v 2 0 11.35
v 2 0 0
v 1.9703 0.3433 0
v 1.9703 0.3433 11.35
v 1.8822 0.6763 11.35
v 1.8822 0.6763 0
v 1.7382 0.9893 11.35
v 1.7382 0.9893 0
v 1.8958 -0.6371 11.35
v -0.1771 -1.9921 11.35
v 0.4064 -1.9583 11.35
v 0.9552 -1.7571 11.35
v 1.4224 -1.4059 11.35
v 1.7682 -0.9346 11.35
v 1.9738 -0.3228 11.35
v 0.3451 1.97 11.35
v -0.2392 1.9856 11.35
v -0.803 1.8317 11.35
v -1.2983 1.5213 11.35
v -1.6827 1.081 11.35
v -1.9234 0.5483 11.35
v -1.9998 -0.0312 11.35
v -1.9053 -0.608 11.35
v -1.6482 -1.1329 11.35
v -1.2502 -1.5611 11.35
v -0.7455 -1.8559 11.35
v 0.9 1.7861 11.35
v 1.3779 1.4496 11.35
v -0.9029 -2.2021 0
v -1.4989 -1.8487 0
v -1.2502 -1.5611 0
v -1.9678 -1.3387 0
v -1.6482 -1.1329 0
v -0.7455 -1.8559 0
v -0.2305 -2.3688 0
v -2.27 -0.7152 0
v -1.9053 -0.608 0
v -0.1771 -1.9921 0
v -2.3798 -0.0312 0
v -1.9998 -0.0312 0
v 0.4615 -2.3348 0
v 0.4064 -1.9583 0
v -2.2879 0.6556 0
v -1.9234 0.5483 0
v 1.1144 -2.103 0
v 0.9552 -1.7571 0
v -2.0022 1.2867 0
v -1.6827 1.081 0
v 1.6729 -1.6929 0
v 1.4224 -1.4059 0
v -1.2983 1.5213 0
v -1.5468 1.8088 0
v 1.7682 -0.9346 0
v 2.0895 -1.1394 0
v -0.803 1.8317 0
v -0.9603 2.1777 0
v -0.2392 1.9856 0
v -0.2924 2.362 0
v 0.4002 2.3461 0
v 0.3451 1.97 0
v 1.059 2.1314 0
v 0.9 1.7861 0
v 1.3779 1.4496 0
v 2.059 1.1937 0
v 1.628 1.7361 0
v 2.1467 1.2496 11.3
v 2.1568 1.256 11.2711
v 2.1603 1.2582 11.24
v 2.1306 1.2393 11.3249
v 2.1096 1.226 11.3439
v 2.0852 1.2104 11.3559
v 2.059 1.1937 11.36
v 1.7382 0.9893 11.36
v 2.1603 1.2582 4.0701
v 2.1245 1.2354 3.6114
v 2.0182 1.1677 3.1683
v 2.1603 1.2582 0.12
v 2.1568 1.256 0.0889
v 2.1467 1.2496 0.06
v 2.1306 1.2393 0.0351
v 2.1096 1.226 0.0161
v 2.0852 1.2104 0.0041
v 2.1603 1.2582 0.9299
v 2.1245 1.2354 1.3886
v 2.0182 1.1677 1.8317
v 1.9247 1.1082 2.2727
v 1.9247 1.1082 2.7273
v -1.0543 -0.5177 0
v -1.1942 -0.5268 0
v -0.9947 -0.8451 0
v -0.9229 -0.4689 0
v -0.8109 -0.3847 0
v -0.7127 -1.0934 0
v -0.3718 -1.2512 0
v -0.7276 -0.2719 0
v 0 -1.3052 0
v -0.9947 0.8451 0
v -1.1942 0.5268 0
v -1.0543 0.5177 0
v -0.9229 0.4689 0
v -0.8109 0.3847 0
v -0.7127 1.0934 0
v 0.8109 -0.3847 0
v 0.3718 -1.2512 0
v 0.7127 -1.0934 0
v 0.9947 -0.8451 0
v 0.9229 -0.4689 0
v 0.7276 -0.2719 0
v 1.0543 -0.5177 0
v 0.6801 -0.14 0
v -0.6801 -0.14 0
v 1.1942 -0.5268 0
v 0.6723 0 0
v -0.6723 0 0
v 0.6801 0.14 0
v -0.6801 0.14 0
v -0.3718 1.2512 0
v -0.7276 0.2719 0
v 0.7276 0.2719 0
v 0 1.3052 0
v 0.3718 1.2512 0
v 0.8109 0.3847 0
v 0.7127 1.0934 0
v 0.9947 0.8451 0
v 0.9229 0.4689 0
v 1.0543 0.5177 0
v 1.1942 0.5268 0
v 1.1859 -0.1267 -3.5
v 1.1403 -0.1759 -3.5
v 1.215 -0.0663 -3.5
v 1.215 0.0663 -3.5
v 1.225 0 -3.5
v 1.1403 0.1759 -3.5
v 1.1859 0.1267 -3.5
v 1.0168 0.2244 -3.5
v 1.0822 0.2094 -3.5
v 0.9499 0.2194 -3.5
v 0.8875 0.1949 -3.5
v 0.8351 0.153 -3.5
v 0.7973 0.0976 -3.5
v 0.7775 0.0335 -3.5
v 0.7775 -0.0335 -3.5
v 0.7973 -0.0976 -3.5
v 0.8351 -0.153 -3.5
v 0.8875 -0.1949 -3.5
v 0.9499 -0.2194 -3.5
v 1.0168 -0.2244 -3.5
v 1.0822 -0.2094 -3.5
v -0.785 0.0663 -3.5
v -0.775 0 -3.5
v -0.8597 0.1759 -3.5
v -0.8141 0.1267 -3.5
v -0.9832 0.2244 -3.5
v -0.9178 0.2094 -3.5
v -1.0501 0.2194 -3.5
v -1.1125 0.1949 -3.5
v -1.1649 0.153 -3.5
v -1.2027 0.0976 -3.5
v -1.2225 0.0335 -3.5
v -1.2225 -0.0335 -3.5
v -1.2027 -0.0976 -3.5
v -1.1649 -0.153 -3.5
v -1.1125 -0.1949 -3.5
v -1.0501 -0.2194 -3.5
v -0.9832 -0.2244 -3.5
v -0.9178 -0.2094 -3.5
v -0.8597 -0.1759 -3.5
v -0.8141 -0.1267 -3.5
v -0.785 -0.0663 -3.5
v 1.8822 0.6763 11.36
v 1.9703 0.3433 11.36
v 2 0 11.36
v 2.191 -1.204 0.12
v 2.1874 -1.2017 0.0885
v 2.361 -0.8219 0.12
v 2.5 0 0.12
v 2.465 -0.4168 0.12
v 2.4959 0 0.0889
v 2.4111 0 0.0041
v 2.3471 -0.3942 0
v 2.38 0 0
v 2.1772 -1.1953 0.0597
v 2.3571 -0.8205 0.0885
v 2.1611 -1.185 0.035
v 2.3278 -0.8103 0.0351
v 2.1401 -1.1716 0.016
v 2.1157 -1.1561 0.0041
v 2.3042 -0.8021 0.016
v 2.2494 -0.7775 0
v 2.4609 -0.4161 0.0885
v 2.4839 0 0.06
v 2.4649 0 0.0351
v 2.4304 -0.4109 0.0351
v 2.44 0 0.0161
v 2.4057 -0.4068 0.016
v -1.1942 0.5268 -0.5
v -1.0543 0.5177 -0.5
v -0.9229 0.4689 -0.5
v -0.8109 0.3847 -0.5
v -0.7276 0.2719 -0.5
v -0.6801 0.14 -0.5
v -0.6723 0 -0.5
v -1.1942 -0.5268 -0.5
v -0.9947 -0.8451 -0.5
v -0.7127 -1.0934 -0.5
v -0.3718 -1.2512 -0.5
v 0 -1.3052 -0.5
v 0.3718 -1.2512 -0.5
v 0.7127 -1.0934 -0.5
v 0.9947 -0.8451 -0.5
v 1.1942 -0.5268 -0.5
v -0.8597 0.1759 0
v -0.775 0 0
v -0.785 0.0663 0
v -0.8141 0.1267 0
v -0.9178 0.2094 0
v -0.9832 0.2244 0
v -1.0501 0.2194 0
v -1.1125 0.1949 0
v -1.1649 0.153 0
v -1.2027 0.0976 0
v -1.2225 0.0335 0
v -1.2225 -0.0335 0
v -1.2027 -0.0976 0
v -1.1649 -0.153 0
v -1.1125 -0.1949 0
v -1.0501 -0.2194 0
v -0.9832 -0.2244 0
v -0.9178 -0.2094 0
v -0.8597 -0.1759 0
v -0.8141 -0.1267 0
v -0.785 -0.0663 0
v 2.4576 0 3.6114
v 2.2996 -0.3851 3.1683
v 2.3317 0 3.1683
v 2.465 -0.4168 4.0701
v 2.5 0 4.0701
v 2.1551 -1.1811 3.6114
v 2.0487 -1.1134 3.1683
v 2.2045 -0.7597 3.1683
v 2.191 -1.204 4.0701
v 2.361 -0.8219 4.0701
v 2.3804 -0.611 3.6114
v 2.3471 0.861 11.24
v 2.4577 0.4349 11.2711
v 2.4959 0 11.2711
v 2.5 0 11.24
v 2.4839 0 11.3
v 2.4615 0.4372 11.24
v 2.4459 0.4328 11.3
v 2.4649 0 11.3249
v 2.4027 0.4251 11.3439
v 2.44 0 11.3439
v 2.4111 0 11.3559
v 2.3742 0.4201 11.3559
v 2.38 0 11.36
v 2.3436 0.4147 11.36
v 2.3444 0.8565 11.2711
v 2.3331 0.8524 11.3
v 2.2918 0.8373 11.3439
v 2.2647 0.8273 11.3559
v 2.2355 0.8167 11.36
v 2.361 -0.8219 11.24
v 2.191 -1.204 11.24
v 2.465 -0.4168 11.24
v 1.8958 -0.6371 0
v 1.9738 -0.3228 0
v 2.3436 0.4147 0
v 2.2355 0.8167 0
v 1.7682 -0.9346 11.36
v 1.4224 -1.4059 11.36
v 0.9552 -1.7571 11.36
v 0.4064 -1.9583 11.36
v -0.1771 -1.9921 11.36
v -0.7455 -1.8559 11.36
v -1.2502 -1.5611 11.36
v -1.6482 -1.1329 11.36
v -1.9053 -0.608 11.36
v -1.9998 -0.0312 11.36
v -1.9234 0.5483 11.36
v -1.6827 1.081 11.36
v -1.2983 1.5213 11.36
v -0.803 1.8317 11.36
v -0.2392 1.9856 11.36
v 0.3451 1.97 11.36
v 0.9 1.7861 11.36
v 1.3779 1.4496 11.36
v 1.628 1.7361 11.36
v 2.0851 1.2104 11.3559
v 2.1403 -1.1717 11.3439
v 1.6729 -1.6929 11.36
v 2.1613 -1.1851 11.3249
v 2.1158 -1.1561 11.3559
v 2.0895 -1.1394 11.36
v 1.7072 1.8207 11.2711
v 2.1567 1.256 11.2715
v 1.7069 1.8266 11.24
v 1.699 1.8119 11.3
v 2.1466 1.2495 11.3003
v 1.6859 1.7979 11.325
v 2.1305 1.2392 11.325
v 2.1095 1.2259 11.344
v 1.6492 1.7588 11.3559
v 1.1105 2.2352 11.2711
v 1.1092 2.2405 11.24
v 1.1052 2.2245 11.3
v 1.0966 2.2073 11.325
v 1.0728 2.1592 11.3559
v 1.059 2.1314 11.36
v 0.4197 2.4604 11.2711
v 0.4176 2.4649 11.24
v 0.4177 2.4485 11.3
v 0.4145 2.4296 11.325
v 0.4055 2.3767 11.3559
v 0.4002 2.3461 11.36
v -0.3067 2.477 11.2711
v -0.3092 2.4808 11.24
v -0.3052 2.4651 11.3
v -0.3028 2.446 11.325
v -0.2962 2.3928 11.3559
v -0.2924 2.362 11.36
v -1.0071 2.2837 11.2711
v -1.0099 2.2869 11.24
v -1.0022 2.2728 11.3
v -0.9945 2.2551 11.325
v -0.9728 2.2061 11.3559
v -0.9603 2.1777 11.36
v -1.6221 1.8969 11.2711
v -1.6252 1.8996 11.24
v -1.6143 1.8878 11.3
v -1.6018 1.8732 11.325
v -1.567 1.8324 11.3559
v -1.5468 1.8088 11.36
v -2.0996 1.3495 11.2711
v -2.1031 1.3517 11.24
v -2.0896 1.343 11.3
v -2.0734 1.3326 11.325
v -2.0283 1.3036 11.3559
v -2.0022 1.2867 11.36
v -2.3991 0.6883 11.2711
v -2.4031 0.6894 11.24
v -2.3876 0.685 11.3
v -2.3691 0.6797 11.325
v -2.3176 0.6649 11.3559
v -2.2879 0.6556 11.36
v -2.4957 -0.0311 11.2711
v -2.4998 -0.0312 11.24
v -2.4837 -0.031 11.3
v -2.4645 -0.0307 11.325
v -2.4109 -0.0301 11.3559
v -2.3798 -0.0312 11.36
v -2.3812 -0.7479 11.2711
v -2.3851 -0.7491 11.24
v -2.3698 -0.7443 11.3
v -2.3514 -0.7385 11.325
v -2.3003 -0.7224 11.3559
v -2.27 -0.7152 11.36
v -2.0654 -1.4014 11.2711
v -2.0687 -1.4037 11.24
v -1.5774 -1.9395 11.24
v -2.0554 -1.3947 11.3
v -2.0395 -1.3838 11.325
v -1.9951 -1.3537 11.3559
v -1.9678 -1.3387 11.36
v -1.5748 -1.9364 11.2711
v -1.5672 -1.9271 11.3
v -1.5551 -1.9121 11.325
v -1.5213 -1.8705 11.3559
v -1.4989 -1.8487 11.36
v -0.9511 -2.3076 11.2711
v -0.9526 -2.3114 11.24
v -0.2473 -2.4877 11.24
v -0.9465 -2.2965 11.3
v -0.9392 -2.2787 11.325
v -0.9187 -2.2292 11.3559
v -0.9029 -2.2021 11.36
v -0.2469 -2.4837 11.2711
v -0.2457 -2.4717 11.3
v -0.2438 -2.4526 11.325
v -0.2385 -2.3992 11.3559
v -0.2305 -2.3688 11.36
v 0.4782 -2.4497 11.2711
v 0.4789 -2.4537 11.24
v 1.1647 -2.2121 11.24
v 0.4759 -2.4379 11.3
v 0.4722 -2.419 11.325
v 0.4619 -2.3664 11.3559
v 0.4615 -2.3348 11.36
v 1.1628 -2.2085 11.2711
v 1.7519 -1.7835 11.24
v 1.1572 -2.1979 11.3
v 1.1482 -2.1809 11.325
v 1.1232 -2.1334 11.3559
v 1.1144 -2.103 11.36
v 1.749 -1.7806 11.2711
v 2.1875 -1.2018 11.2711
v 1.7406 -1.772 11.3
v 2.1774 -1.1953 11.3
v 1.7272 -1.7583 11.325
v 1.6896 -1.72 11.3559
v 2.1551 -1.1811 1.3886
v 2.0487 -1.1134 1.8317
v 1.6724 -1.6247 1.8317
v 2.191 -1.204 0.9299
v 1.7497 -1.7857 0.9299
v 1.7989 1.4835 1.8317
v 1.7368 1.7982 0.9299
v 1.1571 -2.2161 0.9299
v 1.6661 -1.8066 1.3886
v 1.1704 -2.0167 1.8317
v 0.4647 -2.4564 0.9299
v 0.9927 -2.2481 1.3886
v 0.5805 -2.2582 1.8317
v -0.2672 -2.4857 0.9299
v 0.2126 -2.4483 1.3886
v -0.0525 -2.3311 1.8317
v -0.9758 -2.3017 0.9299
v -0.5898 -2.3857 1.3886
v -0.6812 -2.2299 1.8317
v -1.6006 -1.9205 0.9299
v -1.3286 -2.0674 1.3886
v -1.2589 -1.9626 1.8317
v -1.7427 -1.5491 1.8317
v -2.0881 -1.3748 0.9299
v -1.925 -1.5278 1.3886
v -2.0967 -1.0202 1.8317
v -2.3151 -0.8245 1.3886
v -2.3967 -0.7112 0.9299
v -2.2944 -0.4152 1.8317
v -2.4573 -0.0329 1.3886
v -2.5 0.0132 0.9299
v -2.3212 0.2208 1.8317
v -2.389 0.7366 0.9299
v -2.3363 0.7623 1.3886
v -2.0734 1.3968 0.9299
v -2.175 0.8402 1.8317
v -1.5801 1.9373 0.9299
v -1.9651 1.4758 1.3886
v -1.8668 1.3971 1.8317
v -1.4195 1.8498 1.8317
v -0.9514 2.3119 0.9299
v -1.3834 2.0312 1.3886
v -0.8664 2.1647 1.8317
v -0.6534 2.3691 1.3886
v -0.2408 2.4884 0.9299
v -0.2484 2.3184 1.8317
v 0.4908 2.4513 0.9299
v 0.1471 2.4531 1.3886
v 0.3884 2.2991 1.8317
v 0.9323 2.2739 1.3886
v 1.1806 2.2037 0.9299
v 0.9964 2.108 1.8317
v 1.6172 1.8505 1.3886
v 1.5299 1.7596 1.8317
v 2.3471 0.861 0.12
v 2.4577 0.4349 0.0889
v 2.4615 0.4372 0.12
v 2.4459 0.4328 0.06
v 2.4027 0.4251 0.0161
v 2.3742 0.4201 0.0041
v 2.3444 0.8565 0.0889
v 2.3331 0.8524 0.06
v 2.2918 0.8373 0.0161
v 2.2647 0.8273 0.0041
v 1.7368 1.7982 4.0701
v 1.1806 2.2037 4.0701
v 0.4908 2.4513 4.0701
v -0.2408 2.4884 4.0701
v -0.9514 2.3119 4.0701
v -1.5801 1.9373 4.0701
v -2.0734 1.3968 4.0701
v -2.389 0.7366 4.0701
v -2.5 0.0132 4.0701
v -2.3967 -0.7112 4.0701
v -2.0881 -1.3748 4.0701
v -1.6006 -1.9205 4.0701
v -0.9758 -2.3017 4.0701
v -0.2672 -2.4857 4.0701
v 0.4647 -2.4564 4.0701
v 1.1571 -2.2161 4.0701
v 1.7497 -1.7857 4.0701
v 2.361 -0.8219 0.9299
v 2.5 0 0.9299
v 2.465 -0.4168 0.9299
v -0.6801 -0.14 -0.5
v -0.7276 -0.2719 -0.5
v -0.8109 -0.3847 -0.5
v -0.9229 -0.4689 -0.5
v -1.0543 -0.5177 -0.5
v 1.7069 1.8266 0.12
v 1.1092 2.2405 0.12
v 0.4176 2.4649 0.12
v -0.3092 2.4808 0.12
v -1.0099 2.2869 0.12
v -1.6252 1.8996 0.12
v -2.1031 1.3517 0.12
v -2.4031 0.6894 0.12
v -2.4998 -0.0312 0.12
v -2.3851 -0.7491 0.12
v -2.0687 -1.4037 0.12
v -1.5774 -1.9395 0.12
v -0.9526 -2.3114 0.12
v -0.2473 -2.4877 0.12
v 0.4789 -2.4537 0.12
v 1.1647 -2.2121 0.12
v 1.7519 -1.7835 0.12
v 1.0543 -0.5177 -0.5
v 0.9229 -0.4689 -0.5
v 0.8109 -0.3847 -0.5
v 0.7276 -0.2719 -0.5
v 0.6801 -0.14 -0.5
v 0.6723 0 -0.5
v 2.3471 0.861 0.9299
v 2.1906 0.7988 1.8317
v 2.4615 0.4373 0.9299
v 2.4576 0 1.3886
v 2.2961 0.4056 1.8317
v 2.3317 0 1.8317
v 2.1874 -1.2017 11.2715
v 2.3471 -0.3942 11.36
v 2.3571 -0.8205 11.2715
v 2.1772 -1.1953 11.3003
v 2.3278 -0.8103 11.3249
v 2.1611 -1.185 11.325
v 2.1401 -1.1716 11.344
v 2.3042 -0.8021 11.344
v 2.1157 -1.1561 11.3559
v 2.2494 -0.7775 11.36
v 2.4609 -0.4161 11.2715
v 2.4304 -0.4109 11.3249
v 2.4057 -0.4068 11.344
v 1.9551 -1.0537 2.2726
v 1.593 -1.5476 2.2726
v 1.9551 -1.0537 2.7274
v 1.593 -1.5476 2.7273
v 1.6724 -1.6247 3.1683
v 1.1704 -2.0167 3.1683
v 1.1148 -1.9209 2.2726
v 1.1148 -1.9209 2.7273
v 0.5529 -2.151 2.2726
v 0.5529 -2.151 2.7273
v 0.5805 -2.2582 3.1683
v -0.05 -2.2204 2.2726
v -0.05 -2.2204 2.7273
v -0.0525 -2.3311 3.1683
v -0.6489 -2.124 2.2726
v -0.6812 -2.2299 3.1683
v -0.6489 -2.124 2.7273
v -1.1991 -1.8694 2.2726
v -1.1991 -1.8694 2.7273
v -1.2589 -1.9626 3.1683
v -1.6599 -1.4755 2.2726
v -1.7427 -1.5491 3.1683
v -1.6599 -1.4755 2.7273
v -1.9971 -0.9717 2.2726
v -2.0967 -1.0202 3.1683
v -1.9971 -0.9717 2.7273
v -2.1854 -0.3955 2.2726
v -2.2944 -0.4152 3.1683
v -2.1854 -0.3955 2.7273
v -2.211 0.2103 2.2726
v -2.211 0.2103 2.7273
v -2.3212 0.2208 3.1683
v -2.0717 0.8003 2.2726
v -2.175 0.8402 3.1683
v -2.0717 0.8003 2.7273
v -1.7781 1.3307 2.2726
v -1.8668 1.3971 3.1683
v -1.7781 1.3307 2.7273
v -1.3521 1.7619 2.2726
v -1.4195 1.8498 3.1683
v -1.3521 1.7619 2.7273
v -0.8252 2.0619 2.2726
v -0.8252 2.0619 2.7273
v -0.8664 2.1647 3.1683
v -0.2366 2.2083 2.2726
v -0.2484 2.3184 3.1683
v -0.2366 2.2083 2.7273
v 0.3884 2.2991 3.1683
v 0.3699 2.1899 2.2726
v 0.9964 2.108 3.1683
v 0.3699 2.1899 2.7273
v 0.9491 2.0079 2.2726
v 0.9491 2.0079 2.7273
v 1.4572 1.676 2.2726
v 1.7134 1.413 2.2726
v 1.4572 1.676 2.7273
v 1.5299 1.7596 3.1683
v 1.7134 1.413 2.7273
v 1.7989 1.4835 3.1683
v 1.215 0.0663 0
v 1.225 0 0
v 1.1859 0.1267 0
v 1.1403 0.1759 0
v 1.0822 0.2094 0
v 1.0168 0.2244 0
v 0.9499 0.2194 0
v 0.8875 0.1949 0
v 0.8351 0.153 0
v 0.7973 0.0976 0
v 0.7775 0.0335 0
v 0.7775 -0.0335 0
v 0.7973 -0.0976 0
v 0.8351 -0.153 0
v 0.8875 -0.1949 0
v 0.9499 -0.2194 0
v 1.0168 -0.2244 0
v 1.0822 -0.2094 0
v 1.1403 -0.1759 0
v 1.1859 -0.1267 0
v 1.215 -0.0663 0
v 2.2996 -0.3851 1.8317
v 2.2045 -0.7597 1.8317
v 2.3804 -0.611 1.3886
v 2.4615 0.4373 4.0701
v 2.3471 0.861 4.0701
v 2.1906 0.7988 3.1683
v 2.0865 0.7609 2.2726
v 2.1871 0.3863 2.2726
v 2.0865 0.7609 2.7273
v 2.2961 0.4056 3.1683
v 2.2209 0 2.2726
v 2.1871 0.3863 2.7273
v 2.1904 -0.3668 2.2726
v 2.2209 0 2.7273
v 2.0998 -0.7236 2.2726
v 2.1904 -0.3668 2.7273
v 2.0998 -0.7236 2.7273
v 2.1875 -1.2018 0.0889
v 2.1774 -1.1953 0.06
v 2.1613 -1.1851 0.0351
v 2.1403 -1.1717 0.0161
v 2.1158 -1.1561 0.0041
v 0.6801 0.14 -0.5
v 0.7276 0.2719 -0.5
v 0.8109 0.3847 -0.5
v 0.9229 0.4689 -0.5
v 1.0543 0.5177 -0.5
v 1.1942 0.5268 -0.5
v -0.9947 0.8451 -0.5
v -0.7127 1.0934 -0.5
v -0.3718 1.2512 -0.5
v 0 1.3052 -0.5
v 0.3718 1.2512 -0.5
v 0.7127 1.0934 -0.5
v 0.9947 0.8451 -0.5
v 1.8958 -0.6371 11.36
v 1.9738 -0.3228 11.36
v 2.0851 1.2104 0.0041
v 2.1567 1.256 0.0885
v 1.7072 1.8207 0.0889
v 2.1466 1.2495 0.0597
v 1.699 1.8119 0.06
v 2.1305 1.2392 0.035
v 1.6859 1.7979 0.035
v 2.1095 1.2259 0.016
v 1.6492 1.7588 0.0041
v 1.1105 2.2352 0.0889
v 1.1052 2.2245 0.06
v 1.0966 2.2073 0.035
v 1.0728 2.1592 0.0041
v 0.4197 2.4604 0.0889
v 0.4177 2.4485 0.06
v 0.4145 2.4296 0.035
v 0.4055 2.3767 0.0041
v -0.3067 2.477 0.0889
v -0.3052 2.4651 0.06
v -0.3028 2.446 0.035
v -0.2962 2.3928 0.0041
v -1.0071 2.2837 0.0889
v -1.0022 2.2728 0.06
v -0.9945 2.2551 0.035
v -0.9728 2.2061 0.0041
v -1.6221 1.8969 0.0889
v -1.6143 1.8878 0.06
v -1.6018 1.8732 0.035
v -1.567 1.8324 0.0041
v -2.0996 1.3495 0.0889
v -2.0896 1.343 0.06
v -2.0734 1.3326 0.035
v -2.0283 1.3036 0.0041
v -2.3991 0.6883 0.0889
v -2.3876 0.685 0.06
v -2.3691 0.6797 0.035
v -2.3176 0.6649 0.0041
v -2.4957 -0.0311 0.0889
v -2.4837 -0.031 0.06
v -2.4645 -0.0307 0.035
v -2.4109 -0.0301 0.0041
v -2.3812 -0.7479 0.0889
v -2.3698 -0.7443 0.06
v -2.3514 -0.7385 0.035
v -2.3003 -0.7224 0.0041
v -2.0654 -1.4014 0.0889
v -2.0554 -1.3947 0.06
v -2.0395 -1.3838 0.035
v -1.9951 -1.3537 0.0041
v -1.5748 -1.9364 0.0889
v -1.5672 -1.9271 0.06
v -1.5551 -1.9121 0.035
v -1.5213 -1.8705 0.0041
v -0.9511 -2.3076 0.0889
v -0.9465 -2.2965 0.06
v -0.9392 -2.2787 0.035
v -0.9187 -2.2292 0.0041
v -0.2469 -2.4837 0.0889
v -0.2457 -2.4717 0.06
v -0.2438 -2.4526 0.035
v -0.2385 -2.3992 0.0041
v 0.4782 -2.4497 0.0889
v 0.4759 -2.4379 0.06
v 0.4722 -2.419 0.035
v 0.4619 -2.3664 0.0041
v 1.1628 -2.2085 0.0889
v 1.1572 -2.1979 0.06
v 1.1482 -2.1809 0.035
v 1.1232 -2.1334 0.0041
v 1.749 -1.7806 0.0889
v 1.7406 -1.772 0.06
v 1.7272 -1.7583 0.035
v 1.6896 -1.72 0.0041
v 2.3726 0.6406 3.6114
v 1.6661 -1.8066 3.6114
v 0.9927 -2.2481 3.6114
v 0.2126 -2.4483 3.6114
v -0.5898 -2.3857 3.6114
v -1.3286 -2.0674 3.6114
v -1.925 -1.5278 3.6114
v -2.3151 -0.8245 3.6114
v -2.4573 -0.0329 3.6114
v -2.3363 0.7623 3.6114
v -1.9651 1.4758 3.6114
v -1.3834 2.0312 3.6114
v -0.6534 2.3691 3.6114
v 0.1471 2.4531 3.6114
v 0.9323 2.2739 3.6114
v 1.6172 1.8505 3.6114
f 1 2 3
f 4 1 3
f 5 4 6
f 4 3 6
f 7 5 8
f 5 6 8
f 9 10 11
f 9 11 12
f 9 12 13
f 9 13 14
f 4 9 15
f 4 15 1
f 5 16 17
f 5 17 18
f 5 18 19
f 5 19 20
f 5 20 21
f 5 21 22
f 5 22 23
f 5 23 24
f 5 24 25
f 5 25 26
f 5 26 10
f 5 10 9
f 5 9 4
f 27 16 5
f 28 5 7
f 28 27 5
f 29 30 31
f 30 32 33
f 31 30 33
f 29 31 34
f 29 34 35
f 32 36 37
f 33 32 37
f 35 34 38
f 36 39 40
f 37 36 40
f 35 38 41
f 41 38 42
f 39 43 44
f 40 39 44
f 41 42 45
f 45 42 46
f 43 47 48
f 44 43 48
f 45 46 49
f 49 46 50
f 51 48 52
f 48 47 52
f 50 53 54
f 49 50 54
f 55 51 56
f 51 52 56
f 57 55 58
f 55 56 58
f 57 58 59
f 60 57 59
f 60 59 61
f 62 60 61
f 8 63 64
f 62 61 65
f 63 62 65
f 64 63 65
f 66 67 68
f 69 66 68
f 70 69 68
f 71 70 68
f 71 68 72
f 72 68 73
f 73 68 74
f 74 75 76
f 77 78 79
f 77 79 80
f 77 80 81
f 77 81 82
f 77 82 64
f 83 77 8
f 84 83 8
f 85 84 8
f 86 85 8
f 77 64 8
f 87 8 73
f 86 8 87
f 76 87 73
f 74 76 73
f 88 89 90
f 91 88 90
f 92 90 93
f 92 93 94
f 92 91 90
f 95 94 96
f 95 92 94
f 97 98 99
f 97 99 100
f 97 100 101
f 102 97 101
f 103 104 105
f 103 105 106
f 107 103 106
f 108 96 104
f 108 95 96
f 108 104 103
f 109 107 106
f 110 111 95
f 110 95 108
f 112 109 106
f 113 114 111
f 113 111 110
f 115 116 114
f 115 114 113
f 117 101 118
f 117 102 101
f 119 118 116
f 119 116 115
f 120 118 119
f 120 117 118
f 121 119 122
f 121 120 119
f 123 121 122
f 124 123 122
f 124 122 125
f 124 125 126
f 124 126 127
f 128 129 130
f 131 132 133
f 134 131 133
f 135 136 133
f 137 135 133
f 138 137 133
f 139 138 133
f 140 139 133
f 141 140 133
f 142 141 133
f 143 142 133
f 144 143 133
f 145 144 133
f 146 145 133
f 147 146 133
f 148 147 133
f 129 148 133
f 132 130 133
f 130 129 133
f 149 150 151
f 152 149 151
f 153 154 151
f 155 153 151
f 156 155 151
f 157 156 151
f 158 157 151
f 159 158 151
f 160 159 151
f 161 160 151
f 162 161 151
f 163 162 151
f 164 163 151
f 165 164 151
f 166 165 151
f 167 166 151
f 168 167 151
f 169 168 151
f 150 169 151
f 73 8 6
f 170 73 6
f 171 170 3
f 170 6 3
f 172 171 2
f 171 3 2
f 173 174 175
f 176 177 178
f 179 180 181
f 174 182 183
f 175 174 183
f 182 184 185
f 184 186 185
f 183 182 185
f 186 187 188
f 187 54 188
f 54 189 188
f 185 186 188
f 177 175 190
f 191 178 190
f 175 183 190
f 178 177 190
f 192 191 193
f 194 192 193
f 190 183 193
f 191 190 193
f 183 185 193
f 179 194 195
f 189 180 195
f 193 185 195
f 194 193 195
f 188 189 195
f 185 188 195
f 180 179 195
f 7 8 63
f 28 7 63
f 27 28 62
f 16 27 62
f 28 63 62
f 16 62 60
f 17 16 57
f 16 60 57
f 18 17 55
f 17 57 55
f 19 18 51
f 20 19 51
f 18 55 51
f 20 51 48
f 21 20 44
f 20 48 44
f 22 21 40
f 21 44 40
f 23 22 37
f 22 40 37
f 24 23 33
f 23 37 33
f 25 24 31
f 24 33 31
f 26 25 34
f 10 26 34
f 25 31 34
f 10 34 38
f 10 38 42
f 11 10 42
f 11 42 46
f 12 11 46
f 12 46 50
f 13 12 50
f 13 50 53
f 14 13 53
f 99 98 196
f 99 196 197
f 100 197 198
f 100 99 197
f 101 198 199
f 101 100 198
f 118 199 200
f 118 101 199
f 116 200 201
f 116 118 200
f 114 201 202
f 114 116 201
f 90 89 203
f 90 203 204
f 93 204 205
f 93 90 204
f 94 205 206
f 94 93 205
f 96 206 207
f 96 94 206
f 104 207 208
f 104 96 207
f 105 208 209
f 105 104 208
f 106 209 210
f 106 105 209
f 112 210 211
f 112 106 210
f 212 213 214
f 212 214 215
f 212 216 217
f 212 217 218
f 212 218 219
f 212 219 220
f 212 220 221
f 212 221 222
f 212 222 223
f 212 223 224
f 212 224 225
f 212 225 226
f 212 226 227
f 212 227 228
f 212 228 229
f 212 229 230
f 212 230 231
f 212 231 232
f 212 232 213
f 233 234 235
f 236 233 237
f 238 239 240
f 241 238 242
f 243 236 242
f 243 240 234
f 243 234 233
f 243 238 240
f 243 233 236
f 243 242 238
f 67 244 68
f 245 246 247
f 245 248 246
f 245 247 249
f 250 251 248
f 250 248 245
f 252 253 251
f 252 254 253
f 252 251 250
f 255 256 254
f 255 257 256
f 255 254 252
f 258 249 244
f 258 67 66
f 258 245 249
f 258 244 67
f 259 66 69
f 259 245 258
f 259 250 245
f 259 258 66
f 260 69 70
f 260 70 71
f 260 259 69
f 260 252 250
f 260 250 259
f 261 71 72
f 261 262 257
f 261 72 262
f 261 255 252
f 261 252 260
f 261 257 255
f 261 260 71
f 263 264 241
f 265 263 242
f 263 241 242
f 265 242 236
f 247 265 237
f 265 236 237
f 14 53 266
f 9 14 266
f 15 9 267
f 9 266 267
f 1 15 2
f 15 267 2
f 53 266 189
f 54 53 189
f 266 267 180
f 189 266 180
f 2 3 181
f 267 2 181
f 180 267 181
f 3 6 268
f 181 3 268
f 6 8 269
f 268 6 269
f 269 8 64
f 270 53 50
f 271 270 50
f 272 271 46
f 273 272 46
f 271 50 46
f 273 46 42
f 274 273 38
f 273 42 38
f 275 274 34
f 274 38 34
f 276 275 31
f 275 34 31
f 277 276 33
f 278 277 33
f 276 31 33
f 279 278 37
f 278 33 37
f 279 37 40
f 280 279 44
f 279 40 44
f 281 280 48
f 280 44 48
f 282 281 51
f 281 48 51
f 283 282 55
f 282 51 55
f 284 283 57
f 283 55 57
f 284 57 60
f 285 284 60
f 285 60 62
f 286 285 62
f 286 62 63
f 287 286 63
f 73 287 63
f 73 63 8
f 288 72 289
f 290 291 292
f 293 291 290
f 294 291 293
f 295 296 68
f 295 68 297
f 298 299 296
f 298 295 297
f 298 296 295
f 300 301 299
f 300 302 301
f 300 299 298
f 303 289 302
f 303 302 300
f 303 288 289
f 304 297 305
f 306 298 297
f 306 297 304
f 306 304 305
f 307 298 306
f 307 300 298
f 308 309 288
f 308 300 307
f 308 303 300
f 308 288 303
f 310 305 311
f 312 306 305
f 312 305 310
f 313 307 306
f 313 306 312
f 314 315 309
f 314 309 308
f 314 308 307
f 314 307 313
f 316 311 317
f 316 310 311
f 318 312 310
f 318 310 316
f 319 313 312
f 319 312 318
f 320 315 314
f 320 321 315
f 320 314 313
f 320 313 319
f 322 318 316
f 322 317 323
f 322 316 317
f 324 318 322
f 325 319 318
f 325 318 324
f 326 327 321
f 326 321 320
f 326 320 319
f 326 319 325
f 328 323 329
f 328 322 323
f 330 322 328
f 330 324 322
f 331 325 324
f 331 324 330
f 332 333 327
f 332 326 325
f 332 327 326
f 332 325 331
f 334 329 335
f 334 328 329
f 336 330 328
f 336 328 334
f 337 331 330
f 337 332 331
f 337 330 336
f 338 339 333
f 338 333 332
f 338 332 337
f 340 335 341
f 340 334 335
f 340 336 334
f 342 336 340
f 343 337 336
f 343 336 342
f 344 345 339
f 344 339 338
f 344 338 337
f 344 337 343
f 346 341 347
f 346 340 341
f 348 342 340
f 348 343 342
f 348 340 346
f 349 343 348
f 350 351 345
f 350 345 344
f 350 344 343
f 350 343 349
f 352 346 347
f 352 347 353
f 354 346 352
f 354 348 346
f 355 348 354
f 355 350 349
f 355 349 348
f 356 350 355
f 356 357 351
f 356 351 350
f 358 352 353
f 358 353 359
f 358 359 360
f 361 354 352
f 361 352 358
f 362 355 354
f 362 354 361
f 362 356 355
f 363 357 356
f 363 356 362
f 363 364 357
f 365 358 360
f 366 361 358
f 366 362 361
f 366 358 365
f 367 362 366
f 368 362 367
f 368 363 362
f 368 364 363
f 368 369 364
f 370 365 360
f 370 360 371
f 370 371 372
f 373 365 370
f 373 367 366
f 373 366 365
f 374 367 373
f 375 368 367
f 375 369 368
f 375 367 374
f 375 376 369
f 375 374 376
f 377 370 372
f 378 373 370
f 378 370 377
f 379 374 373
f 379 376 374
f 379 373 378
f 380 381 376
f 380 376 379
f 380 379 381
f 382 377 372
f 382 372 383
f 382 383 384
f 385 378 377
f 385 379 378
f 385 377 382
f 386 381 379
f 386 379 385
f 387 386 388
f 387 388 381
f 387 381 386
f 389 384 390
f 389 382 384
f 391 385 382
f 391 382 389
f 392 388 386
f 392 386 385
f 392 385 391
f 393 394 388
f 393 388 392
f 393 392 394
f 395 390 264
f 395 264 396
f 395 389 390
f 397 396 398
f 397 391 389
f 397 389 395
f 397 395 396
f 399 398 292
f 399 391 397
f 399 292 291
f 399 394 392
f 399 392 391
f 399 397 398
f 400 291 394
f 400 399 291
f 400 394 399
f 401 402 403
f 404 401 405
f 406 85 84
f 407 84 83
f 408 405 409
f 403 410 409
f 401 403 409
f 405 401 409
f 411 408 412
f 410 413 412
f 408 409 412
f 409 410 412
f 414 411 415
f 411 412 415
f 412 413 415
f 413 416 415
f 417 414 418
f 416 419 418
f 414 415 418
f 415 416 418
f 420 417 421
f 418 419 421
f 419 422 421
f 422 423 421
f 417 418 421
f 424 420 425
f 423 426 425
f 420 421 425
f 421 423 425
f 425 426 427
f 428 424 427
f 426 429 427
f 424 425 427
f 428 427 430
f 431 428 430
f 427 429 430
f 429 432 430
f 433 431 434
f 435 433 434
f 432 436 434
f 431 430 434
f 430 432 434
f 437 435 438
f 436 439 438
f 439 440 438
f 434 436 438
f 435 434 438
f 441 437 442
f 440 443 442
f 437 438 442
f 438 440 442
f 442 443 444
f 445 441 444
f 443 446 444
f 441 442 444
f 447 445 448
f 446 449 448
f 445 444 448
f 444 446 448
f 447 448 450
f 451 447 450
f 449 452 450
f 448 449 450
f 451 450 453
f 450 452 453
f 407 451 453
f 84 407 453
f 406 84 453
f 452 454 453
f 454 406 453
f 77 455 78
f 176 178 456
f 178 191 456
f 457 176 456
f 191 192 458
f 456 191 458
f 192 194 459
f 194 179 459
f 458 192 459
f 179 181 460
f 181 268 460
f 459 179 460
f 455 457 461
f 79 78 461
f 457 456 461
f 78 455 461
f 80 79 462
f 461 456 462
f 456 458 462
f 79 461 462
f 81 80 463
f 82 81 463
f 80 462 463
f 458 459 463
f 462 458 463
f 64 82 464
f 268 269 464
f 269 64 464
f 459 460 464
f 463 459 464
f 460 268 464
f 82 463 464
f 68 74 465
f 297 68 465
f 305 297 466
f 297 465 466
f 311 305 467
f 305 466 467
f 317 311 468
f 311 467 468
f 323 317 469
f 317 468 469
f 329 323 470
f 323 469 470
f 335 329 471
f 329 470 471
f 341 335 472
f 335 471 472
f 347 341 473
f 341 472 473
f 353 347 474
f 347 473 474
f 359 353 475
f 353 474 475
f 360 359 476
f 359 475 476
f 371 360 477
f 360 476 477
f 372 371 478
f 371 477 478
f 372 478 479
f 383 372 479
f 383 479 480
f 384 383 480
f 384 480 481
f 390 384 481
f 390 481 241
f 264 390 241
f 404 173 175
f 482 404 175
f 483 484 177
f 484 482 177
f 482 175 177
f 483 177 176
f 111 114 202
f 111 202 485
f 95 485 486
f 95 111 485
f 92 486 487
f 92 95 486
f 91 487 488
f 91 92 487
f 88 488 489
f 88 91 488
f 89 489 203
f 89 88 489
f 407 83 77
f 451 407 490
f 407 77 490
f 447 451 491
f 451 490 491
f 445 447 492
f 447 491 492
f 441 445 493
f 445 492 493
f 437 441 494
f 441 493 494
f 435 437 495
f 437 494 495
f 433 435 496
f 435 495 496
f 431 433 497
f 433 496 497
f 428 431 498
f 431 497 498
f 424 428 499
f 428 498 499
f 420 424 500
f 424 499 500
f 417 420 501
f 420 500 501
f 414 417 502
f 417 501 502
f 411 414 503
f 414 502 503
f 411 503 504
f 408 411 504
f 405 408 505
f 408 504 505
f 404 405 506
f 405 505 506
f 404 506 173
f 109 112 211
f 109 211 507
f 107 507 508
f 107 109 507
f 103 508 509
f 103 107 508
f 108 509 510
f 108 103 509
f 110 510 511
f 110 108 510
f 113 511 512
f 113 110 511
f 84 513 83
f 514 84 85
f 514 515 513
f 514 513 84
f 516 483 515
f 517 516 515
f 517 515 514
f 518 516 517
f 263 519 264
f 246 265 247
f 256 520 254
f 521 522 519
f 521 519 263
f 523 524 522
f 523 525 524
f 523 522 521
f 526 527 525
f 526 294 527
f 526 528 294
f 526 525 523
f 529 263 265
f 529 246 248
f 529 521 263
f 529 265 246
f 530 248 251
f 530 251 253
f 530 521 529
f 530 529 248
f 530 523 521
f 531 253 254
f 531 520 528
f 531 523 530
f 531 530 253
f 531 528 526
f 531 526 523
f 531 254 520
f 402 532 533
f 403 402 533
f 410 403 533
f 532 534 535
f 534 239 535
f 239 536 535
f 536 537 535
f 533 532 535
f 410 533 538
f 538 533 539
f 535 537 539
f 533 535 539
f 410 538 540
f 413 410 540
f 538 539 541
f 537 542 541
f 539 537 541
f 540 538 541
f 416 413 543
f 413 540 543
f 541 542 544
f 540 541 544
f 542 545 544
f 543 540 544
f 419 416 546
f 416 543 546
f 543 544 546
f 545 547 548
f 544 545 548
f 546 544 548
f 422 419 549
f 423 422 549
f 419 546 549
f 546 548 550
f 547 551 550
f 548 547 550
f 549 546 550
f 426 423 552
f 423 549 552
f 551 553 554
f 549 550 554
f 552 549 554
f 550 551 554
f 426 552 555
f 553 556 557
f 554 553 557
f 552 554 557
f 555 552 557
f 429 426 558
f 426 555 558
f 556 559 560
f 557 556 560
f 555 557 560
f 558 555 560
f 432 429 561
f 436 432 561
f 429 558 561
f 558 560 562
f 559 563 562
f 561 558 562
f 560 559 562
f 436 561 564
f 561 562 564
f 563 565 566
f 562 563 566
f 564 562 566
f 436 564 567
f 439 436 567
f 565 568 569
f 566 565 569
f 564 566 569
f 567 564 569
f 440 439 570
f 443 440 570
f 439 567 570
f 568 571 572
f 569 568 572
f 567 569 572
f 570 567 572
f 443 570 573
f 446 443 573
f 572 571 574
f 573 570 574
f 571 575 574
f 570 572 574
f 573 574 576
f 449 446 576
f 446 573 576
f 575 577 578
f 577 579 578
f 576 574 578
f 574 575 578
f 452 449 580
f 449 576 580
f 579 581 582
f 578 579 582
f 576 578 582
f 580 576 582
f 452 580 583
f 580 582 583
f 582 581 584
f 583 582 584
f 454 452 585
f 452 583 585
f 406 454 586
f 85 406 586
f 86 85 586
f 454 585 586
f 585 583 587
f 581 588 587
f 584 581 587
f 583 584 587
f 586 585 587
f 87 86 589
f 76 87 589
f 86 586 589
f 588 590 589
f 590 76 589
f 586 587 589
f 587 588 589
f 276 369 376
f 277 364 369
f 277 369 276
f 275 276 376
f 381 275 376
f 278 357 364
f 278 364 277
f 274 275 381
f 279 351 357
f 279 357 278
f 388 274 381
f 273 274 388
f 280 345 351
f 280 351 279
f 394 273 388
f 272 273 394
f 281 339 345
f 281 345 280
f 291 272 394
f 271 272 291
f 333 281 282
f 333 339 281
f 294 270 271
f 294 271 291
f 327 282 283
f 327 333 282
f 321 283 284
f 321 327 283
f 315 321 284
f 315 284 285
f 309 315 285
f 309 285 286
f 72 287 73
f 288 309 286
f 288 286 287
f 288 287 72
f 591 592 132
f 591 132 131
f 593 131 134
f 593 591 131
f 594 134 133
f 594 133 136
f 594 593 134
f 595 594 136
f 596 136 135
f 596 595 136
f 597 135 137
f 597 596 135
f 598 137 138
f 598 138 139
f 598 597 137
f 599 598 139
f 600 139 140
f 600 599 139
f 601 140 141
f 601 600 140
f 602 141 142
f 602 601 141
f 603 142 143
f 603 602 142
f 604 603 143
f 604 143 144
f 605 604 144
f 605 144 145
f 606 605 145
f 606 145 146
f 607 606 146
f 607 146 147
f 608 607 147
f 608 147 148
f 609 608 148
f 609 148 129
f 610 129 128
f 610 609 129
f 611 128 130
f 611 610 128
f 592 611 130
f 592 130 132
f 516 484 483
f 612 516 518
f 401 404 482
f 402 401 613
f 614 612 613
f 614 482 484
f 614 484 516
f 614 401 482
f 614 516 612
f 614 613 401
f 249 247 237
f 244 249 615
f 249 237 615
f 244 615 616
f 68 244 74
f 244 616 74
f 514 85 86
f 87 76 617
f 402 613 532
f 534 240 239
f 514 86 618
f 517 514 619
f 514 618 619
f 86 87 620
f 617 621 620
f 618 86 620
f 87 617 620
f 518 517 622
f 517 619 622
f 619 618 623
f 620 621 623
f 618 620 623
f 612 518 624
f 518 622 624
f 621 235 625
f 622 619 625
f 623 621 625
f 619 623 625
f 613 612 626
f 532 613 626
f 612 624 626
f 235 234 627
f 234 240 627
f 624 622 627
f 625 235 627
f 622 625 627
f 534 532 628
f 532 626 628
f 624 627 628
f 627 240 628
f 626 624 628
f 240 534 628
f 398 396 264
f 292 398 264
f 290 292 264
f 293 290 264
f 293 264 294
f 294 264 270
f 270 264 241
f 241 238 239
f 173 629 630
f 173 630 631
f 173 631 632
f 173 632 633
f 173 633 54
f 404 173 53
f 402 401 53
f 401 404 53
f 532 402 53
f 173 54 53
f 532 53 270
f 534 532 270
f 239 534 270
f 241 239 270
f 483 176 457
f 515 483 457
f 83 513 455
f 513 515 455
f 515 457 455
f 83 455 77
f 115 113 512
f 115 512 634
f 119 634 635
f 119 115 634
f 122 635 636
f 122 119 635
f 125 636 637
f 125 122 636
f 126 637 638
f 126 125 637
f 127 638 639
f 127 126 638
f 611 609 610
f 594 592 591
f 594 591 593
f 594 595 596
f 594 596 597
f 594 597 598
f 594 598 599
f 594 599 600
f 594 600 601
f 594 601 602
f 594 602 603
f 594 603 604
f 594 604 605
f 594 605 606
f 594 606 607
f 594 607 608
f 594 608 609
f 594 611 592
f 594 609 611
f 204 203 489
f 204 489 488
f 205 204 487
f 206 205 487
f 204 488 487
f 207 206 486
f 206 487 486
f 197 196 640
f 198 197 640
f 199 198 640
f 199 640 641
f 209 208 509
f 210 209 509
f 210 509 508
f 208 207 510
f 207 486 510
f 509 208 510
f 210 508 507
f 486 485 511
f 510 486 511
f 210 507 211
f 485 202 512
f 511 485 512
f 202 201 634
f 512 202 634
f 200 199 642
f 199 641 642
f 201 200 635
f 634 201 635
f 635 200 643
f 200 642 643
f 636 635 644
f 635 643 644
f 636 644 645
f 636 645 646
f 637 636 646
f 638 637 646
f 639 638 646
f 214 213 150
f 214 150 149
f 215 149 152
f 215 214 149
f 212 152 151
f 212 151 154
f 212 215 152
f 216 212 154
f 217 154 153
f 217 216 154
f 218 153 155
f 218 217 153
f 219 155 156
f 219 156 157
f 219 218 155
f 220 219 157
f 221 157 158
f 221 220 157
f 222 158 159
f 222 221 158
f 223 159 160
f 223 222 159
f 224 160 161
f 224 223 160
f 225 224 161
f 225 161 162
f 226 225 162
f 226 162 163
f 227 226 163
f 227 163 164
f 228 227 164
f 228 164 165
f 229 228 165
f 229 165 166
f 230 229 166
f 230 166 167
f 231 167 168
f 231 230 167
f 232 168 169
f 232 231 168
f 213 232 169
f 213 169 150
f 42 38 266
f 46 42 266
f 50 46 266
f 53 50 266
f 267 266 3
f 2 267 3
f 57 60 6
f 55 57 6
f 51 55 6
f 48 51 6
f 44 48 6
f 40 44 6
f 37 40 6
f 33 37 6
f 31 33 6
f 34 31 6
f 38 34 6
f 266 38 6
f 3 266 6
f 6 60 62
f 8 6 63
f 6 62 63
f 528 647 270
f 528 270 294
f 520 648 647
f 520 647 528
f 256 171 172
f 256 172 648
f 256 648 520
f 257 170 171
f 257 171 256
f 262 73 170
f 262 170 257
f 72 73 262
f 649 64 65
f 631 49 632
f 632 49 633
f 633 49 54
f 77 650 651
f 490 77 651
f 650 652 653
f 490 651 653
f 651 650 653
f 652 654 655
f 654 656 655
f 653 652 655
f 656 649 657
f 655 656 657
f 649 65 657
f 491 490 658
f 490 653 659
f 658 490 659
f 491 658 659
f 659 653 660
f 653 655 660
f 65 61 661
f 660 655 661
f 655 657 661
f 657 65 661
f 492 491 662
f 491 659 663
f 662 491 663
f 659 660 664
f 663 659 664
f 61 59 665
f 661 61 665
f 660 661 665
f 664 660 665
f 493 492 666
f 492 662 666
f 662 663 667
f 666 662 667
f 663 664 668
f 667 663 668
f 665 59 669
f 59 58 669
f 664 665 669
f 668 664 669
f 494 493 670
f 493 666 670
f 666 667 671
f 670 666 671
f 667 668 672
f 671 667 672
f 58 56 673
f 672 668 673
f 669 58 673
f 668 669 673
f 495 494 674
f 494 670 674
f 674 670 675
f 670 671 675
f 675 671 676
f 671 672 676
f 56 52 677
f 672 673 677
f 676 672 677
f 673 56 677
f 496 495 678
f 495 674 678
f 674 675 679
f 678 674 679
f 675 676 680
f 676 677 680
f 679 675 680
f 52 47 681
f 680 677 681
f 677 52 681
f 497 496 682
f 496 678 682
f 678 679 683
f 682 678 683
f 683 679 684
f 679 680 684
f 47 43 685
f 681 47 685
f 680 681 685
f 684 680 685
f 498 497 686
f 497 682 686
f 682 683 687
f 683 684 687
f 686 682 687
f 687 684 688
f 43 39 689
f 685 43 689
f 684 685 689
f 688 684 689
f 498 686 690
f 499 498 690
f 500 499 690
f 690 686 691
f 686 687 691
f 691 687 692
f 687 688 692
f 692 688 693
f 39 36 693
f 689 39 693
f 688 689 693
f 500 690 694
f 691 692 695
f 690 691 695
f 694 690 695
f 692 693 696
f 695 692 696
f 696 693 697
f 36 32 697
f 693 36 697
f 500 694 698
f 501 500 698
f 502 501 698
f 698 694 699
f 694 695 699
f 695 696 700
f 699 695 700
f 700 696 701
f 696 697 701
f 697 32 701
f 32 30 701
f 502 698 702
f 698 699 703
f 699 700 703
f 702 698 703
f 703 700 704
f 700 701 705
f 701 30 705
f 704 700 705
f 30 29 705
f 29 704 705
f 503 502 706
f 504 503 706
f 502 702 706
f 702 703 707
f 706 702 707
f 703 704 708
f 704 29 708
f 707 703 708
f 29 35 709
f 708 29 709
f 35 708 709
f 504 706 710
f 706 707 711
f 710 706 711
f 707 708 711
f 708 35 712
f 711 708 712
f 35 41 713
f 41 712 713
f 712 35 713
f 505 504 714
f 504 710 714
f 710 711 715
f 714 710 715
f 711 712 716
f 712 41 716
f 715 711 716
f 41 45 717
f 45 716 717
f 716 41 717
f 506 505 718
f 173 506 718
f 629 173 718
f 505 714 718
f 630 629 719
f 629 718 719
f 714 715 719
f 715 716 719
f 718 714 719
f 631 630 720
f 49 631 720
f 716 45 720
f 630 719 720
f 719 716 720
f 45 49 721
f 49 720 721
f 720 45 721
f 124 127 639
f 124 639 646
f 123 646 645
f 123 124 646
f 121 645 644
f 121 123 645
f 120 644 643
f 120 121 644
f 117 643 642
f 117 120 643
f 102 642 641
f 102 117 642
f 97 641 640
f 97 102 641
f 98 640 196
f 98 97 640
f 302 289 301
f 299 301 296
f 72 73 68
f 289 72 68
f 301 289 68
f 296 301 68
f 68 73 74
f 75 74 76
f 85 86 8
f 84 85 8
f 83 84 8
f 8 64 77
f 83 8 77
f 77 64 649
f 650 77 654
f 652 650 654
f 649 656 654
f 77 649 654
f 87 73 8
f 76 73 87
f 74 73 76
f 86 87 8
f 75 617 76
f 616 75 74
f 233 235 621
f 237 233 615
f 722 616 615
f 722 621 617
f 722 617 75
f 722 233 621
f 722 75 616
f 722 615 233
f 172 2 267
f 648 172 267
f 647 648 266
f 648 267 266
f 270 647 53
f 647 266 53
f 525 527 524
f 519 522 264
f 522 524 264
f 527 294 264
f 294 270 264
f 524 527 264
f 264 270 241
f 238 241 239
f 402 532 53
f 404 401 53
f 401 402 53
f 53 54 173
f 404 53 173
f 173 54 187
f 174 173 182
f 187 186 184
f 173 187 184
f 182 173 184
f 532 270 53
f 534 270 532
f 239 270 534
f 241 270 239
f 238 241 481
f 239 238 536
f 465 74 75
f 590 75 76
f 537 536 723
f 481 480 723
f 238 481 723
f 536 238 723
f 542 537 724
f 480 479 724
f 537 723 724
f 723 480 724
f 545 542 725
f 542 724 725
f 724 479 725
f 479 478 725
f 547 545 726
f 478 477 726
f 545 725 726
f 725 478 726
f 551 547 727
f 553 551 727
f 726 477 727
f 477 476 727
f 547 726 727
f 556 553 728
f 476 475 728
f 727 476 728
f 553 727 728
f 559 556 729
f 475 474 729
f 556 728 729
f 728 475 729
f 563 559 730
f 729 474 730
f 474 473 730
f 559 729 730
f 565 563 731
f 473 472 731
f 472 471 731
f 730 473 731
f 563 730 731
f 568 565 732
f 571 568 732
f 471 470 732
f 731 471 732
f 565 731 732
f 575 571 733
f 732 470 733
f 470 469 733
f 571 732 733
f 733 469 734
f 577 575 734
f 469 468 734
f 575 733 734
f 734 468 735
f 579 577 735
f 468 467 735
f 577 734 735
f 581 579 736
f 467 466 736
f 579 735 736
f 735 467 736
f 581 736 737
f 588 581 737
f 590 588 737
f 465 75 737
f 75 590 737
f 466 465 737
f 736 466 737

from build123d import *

# Parameters (mm, degrees)
F2_DEPTH = 11.35
F3_DEPTH = 11.36
F4_DEPTH = 11.36
F5_R     = 0.12
F5_2_R   = 0.12
F1_R     = 0.225
F6_DEPTH = 3.5
F8_DEPTH = 0.5
F11_R    = 2.5
F11_2_R  = 2.5


with BuildPart() as f2:
    # F0 (on Top) → F2 (new body)
    with BuildSketch(Plane.XY):
        with BuildLine():
            ThreePointArc((2, 0), (1.9334353676, 0.5116909997), (1.7381723208, 0.9893214761))
            ThreePointArc((1.7381723208, 0.9893214761), (-1.9997568877, -0.0311831677), (1.7681736576, -0.9346453426))
            ThreePointArc((1.7681736576, -0.9346453426), (1.9411784198, -0.4814834809), (2, 0))
        make_face()
    extrude(amount=F2_DEPTH)


with BuildPart() as f3:
    # F0 (on Top) → F3 (new body)
    with BuildSketch(Plane.XY):
        with BuildLine():
            Line((1.7381723208, 0.9893214761), (2.160286451, 1.2582378351))
            ThreePointArc((2.160286451, 1.2582378351), (-2.4998058142, -0.0311591305), (2.1909773231, -1.204000984))
            Line((2.1909773231, -1.204000984), (1.7681736576, -0.9346453426))
            ThreePointArc((1.7681736576, -0.9346453426), (-1.9997568877, -0.0311831677), (1.7381723208, 0.9893214761))
        make_face()
    extrude(amount=F3_DEPTH)

    # F5
    f5_edges = [f3.edges().sort_by_distance(p)[0] for p in [
        (-2.499806, -0.031159, 11.36),
        (-2.499806, -0.031159, 0),
    ]]
    fillet(f5_edges, radius=F5_R)


with BuildPart() as f4:
    # F0 (on Top) → F4 (new body)
    with BuildSketch(Plane.XY):
        with BuildLine():
            ThreePointArc((2.1909773231, -1.204000984), (2.4215122659, -0.6215129493), (2.5, 0))
            ThreePointArc((2.5, 0), (2.4135778553, 0.6516455603), (2.160286451, 1.2582378351))
            Line((2.160286451, 1.2582378351), (1.7381723208, 0.9893214761))
            ThreePointArc((1.7381723208, 0.9893214761), (1.9334353676, 0.5116909997), (2, 0))
            ThreePointArc((2, 0), (1.9411784198, -0.4814834809), (1.7681736576, -0.9346453426))
            Line((1.7681736576, -0.9346453426), (2.1909773231, -1.204000984))
        make_face()
    extrude(amount=F4_DEPTH)

    # F5#2
    f5_2_edges = [f4.edges().sort_by_distance(p)[0] for p in [
        (2.499806, 0.031159, 11.36),
        (2.499806, 0.031159, 0),
    ]]
    fillet(f5_2_edges, radius=F5_2_R)


with BuildPart() as f6:
    # F1 (on Top) → F6 (new body)
    with BuildSketch(Plane.XY):
        with Locations((-1, 0)):
            Circle(F1_R)
    extrude(amount=-F6_DEPTH)


with BuildPart() as f6b:
    # F1 (on Top) → F6, piece 2 (new body)
    with BuildSketch(Plane.XY):
        with Locations((1, 0)):
            Circle(F1_R)
    extrude(amount=-F6_DEPTH)


with BuildPart() as f8:
    # F7 (on face) → F8 (new body)
    with BuildSketch(Plane.XY):
        with BuildLine():
            ThreePointArc((0.672306749, 0), (0.8108511183, 0.3846531404), (1.1941840541, 0.5268095364))
            ThreePointArc((1.1941840541, 0.5268095364), (0, 1.30522176), (-1.1941840541, 0.5268095364))
            ThreePointArc((-1.1941840541, 0.5268095364), (-0.8108511183, 0.3846531404), (-0.672306749, 0))
            ThreePointArc((-0.672306749, 0), (-0.8108511183, -0.3846531404), (-1.1941840541, -0.5268095364))
            ThreePointArc((-1.1941840541, -0.5268095364), (0, -1.30522176), (1.1941840541, -0.5268095364))
            ThreePointArc((1.1941840541, -0.5268095364), (0.8108511183, -0.3846531404), (0.672306749, 0))
        make_face()
    extrude(amount=-F8_DEPTH)


with BuildPart() as f10_tool:
    # F9 (on Front) → F10 (revolve)
    with BuildSketch(Plane.XZ):
        with BuildLine():
            ThreePointArc((-2.5, 1.5), (-2.2069329005, 2.5), (-2.5, 3.5))
            Line((-2.5, 3.5), (-2.5, 1.5))
        make_face()
    revolve(axis=Axis((0, 0, 0), (0, 0, -1)))


with BuildPart() as f3_1:
    add(f3.part)

    # F10: cut by f10_tool
    add(f10_tool.part, mode=Mode.SUBTRACT)

    # F11
    f11_edges = [f3_1.edges().sort_by_distance(p)[0] for p in [
        (-2.499806, -0.031159, 3.5),
        (-2.499806, -0.031159, 1.5),
    ]]
    fillet(f11_edges, radius=F11_R)


with BuildPart() as f4_1:
    add(f4.part)

    # F10: cut by f10_tool
    add(f10_tool.part, mode=Mode.SUBTRACT)

    # F11#2
    f11_2_edges = [f4_1.edges().sort_by_distance(p)[0] for p in [
        (2.499806, 0.031159, 3.5),
        (2.499806, 0.031159, 1.5),
    ]]
    fillet(f11_2_edges, radius=F11_2_R)


solid = Compound([f2.part, f6.part, f6b.part, f8.part, f3_1.part, f4_1.part])
